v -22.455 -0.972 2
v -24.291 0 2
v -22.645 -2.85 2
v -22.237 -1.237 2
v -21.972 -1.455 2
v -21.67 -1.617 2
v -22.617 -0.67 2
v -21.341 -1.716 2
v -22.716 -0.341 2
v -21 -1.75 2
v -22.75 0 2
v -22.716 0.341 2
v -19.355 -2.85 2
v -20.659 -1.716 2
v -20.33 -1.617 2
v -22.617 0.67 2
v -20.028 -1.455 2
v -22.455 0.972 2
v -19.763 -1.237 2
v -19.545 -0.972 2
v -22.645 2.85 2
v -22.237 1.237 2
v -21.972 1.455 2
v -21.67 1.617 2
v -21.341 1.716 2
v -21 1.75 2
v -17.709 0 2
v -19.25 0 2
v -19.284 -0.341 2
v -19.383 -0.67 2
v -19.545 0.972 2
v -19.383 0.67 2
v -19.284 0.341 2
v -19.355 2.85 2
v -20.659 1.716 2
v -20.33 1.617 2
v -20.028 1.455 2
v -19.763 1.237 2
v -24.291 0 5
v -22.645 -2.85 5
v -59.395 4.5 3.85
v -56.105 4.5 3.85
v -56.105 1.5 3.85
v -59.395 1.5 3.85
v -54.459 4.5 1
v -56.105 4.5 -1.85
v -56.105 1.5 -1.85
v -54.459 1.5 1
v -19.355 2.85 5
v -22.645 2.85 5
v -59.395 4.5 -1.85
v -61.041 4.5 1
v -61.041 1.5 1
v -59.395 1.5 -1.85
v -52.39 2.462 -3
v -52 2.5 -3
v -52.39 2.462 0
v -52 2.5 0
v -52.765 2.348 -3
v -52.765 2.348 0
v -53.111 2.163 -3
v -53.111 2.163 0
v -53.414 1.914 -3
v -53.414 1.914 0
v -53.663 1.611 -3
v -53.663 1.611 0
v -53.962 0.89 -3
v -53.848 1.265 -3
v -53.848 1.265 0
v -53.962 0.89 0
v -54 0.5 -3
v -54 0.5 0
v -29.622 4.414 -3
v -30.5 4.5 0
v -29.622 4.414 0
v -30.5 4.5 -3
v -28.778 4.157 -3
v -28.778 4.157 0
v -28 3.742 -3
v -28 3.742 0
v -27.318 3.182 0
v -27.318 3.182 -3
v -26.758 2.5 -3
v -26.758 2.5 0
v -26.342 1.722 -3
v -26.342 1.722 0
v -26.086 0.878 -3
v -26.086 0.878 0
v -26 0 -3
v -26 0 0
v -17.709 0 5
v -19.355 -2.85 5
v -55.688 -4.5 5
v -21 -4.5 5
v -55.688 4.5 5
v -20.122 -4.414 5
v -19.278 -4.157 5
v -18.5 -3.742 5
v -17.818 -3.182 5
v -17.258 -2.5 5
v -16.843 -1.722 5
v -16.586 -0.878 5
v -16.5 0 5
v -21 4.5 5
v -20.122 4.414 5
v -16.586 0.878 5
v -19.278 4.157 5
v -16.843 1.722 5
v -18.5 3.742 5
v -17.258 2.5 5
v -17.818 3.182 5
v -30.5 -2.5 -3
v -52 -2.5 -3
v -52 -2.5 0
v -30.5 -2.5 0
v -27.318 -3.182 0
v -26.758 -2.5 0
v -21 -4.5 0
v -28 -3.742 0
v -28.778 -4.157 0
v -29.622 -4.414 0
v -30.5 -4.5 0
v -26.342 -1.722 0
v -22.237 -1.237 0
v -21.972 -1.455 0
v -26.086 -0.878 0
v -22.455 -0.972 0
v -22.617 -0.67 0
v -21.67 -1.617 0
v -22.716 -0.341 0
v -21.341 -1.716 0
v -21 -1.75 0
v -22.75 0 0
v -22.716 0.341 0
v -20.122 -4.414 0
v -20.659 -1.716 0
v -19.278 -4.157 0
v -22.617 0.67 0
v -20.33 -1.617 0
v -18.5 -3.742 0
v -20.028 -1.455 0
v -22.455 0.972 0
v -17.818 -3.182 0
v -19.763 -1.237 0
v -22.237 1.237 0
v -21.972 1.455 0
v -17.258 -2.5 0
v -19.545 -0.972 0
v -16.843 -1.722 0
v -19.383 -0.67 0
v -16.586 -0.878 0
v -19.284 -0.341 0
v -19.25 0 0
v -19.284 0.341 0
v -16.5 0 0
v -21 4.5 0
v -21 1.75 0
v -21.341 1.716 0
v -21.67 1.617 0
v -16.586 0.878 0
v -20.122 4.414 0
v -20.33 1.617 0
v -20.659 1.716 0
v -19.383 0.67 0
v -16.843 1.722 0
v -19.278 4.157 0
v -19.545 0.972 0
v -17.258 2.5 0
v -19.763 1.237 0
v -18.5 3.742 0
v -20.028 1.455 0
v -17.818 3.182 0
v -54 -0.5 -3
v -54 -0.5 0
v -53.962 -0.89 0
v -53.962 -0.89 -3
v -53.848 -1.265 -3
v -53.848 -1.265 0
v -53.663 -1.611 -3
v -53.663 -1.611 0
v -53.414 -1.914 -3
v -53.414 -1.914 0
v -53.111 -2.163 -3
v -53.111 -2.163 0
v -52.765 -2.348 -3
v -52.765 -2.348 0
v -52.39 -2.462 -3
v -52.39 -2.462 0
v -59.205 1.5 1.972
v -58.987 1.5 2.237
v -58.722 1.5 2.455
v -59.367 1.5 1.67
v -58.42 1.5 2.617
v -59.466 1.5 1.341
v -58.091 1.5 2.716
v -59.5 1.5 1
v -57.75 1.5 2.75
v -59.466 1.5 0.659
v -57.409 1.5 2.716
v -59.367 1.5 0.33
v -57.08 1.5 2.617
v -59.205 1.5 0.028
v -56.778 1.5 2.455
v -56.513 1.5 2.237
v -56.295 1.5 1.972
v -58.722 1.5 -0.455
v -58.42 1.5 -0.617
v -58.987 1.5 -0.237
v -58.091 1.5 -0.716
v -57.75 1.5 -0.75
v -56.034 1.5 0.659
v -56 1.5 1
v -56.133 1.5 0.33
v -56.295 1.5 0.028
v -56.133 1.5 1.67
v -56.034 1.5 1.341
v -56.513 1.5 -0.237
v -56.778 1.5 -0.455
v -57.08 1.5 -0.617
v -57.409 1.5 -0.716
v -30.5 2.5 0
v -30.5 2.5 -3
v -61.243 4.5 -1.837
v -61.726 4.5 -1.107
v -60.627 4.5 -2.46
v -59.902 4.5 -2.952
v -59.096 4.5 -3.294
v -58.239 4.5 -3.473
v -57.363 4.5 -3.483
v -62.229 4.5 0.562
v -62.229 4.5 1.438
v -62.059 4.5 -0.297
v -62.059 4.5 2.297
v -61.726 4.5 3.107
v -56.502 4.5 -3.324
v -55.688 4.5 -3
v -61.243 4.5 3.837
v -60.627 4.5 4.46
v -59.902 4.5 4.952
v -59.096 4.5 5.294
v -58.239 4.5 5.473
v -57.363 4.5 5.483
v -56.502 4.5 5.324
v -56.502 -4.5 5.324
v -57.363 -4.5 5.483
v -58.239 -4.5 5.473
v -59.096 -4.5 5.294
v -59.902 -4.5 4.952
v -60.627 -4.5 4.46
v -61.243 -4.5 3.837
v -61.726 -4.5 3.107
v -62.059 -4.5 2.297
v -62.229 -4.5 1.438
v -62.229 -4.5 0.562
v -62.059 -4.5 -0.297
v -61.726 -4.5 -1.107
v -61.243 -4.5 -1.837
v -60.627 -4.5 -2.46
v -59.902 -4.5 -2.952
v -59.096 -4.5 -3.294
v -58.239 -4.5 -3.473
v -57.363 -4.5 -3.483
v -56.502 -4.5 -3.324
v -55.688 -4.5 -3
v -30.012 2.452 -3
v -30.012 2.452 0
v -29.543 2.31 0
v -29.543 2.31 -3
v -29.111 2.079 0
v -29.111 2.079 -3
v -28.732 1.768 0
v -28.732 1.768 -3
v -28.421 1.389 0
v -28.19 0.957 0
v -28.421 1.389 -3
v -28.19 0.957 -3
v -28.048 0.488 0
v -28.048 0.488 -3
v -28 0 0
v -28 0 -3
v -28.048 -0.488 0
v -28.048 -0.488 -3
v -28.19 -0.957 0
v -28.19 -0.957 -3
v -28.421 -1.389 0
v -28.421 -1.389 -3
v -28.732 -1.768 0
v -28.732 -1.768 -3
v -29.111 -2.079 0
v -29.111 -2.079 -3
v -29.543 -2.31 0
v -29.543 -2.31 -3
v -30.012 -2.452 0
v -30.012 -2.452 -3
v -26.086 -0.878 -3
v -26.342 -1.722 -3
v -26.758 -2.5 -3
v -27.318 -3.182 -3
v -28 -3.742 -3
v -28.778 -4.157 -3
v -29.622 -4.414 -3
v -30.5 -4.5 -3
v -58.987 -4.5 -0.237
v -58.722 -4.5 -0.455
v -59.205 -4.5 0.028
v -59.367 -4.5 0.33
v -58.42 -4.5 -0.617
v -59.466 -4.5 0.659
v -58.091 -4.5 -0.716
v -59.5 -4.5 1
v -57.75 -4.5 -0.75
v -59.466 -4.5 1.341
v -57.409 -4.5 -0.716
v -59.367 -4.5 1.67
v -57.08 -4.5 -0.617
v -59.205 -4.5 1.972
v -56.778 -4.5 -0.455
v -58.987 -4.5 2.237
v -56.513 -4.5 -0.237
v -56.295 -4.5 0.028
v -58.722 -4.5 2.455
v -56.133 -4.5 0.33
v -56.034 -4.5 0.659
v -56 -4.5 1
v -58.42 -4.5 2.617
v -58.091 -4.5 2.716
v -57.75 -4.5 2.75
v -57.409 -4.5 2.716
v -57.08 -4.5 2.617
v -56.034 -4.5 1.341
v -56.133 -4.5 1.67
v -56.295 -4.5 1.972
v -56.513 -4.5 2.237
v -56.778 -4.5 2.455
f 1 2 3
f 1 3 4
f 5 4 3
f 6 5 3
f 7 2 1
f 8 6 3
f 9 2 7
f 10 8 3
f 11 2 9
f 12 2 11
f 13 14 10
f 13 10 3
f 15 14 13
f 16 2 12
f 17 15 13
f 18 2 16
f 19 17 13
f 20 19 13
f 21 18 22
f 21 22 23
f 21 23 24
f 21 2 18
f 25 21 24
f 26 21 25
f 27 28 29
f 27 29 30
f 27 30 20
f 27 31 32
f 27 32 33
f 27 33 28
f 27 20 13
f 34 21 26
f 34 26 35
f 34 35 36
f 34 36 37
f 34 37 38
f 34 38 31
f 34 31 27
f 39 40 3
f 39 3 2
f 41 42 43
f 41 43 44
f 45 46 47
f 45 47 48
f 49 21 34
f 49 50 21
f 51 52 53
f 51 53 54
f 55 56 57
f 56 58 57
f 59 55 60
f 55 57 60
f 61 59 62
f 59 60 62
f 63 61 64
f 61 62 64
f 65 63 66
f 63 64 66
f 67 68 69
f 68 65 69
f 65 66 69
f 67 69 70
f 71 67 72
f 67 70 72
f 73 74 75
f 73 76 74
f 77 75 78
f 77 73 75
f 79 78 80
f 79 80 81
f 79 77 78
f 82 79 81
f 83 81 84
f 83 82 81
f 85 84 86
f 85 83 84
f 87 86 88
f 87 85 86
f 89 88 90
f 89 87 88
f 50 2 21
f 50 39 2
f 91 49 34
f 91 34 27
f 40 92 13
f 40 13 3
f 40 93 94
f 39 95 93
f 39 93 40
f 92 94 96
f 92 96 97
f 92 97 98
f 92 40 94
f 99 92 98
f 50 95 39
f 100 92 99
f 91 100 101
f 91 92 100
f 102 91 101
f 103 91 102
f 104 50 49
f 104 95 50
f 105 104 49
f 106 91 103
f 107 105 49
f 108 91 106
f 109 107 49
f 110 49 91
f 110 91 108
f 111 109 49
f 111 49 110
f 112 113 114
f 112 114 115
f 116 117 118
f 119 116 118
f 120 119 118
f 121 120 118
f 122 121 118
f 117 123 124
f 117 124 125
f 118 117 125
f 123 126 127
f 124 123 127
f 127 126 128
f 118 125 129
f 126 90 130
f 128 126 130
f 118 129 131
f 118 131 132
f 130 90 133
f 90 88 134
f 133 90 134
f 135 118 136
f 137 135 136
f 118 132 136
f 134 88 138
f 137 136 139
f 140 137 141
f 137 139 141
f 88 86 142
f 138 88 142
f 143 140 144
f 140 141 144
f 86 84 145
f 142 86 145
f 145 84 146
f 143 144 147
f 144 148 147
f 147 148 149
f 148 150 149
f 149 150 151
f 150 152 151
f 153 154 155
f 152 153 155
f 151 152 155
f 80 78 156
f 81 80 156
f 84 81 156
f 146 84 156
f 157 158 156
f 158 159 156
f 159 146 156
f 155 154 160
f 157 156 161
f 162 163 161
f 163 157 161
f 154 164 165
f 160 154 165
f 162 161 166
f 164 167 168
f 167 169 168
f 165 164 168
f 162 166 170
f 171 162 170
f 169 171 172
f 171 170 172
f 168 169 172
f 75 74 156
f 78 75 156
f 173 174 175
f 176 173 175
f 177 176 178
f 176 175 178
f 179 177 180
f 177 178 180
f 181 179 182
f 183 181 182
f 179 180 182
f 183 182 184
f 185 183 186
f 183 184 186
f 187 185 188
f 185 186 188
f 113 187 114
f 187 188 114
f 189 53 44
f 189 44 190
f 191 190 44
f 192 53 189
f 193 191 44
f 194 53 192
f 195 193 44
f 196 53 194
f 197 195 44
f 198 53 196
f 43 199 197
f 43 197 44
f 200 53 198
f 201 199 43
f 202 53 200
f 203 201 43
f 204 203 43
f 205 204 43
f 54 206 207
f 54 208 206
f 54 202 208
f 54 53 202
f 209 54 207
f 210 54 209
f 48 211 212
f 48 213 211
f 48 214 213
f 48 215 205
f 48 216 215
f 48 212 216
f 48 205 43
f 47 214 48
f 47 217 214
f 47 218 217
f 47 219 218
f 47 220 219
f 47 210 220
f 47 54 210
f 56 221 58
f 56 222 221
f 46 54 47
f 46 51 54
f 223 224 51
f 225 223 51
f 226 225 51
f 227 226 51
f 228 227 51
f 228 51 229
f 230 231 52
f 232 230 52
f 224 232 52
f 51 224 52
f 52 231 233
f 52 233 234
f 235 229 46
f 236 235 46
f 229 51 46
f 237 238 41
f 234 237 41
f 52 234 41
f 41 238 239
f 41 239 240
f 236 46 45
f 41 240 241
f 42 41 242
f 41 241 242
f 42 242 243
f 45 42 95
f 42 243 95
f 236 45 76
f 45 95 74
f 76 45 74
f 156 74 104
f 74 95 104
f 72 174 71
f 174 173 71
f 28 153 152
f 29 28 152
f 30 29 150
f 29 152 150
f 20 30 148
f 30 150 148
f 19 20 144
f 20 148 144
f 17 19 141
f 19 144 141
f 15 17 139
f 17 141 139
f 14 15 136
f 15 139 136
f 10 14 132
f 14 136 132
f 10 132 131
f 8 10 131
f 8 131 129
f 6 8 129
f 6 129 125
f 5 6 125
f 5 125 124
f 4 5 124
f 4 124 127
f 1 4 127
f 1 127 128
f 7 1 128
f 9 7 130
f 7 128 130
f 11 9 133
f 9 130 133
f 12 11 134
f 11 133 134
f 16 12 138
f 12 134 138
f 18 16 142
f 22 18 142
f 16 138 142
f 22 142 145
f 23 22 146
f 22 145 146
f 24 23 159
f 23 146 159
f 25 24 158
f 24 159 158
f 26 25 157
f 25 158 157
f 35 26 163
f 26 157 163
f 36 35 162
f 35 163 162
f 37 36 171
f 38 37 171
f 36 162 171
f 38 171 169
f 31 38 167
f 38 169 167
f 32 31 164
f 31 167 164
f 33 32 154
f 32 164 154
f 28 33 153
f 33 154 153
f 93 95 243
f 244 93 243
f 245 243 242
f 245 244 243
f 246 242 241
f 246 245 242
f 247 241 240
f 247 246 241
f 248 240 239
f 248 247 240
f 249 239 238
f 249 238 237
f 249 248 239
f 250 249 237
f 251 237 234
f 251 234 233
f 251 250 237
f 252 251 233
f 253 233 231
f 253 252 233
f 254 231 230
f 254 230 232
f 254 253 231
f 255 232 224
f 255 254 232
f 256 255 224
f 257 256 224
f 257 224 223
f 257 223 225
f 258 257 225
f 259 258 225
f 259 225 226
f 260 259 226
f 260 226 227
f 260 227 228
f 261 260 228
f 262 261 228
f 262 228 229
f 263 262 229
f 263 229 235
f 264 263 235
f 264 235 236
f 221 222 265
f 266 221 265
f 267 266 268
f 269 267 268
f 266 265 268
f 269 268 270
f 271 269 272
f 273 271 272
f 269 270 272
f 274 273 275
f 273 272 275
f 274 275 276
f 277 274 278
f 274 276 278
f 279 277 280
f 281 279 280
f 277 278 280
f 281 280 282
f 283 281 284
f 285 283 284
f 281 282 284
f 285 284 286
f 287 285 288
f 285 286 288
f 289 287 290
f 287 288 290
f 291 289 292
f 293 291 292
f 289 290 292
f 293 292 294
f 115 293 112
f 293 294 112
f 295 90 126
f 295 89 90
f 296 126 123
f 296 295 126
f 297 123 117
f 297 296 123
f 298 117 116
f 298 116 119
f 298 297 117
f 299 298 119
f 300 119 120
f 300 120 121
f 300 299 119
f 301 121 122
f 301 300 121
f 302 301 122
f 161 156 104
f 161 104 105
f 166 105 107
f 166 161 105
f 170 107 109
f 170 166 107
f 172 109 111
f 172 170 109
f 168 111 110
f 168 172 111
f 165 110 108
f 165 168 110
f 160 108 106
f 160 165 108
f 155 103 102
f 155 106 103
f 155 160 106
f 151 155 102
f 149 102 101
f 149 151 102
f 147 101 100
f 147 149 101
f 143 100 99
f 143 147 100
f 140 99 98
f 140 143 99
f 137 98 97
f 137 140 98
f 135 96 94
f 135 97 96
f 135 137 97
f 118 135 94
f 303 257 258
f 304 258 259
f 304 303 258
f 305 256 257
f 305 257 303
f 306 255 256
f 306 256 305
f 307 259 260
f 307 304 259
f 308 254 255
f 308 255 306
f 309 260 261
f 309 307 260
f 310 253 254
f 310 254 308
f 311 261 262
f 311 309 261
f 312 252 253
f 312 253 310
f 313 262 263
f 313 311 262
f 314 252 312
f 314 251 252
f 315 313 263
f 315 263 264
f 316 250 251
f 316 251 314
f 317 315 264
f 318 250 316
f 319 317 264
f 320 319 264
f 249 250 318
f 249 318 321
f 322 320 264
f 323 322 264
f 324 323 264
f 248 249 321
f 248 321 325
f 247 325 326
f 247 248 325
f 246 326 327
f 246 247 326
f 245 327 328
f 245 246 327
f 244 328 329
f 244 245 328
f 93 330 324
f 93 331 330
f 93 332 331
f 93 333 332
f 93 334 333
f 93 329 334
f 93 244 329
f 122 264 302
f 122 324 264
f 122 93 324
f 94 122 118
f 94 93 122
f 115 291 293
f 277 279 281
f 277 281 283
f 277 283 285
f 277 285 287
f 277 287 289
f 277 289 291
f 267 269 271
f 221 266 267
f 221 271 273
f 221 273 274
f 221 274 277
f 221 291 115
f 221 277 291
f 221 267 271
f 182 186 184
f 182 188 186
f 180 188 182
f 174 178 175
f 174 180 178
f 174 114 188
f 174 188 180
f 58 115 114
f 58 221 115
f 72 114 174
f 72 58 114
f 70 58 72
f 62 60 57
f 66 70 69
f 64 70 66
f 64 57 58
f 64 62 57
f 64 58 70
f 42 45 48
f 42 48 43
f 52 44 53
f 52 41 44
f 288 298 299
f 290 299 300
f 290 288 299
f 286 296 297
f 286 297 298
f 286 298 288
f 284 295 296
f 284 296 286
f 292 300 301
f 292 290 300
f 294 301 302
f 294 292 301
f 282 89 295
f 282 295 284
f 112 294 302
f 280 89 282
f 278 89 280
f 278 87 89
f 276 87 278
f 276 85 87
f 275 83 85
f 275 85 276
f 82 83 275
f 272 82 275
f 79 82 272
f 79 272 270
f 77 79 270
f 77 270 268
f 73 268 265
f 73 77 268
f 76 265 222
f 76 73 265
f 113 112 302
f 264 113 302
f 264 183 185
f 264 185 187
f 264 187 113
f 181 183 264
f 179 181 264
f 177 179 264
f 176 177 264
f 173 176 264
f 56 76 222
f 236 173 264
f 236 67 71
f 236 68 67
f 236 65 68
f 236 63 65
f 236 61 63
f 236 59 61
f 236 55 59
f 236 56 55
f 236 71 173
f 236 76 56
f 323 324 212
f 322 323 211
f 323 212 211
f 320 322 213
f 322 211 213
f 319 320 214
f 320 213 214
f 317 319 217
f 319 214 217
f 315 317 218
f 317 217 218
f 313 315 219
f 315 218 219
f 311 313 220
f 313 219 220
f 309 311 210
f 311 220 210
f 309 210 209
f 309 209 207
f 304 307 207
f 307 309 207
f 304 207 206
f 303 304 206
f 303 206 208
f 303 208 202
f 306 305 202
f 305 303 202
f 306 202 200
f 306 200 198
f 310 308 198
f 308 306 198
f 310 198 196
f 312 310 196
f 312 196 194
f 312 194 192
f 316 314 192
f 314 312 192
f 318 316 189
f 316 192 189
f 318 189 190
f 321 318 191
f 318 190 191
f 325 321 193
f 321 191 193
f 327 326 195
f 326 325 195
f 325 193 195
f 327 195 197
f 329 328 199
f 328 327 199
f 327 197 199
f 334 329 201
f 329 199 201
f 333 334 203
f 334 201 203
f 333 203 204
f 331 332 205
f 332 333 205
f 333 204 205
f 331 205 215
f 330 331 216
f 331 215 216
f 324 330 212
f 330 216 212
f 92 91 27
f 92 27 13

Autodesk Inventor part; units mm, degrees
ref_plane "YZ Plane" through (0, 0, 0) normal (1, 0, 0) x (0, 1, 0)
ref_plane "Płaszczyzna konstrukcyjna2" through (-16.0063, -4.5, 5) normal (0, 0, 1) x (1, 0, 0)
sketch "Szkic1" plane through (0, 0, 0) normal (0, 0, 1) x (1, 0, 0)
  circle A0 centre (-21, 0) radius 1.75 projected
  arc A1 (-11.0125, 4.5) -> (-15.9781, 0.0856) centre (-11.0125, -0.5) ccw projected
  line L0 (-21, 4.5) -> (-11.0125, 4.5) projected
  arc A2 (-21, 4.5) -> (-21, -4.5) centre (-21, 0) ccw projected
  line L1 (-11.0628, -4.5) -> (-21, -4.5) projected
  arc A3 (-15.9446, -0.5811) -> (-11.0628, -4.5) centre (-11.0628, 0.5) ccw projected
  line L2 (-21, 0) -> (-57.75, 0)
  line L3 (-21, 0) -> (-57.75, 0) construction
  line L4 (-21, -4.5) -> (-57.75, -4.5)
  line L5 (-57.75, 4.5) -> (-21, 4.5)
  arc A4 (-21, -4.5) -> (-21, 4.5) centre (-21, 0) ccw
  arc A5 (-57.75, 4.5) -> (-57.75, -4.5) centre (-57.75, 0) ccw
  line L6 (-57.75, 4.5) -> (-57.75, -4.5)
  arc A6 (-15.9781, 0.0856) -> (-15.9446, -0.5811) centre (-13.9919, -0.1486) ccw projected
  point P0 (0, 0)
  point P1 (-39.375, 0)
  dimension "d0" = 36.75
extrude "Wyciągnięcie proste1" add sketch "Szkic1" along normal up to surface (5 mm away) contours A2 A4 | A2 L4 L6 L2 | L2 L6 L5 A2
sketch "Szkic2" plane through (0, 0, 0) normal (0, 0, -1) x (-1, 0, 0)
  line L0 (21, 4.5) -> (57.75, 4.5) projected
  arc A0 (21, 4.5) -> (21, -4.5) centre (21, 0) ccw projected
  line L1 (57.75, -4.5) -> (21, -4.5) projected
  line L2 (57.75, 4.5) -> (57.75, -4.5) projected
  circle A1 centre (21, 0) radius 1.75 projected
  arc A2 (21, -4.5) -> (21, 4.5) centre (21, 0) ccw projected
  circle A3 centre (21, 0) radius 5
  point P0 (0, 0)
  point P1 (23.1794, 4.5)
  point P2 (23.1794, -4.5)
  dimension "d3" = 10
ref_plane "Płaszczyzna konstrukcyjna1" through (-25.5, -4.5, -3) normal (0, 0, -1) x (0, 1, 0)
extrude "Wyciągnięcie proste2" add sketch "Szkic2" along normal up to surface (3 mm away) contours L0 L2 L1 A3
fillet "Zaokrąglenie1" radius 4.5 2 edges at (-23.1794, -4.5, -1.5) (-23.1794, 4.5, -1.5)
sketch "Szkic4" plane through (-57.75, 4.5, 5) normal (0, 1, 0) x (1, 0, 0)
  line L0 (0, 8) -> (0, 0) projected
  circle A0 centre (0, 4) radius 1.75
  circle A1 centre (0, 4) radius 4
  point P0 (57.75, 5)
  point P1 (0, 2.25)
  point P2 (0, 5.75)
  dimension "d15" = 3.5
extrude "Wyciągnięcie proste6" add sketch "Szkic4" against normal up to surface (9 mm away) contours L0 A0 A1 picked at (-0.4587, 0.8057)
extrude "Wyciągnięcie proste7" cut sketch "Szkic4" against normal through all contours A0 L0 picked at (0.2531, 4.5256)
sketch "Szkic5" plane through (-30.5, 0, -3) normal (0, 0, -1) x (-1, 0, 0)
  arc A0 (0, 4.5) -> (0, -4.5) centre (0, 0) ccw projected
  line L0 (27.25, -4.5) -> (0, -4.5) projected
  line L1 (27.25, 4.5) -> (27.25, -4.5) projected
  line L2 (0, 4.5) -> (27.25, 4.5) projected
  line L3 (29, -4.5) -> (29, 4.5) projected
  line L4 (25.5, -4.5) -> (25.5, 4.5) projected
  line L5 (23.5, -4.5) -> (23.5, 4.5)
  arc A1 (0, 2.5) -> (0, -2.5) centre (0, 0) ccw
  line L6 (0, 2.5) -> (25.25, 2.5)
  line L7 (25.25, 2.5) -> (25.25, -2.5)
  line L8 (25.25, -2.5) -> (0, -2.5)
  point P0 (-30.5, 0)
  point P1 (23.5, -2.5)
  point P2 (23.5, 2.5)
  dimension "d20" = 2
  dimension "d21" = 2
extrude "Wyciągnięcie proste8" cut sketch "Szkic5" against normal up to surface (3 mm away) contours L5 L8 A1 L6
fillet "Zaokrąglenie2" radius 2 2 edges at (-54, 2.5, -1.5) (-54, -2.5, -1.5)
sketch "Szkic6" plane through (-21, 0, 5) normal (0, 0, 1) x (1, 0, 0)
  circle A0 centre (0, 0) radius 1.75 projected
  circle A1 centre (0, 0) radius 2.85
  line L0 (1.6454, 2.85) -> (3.2909, 0)
  line L1 (3.2909, 0) -> (1.6454, -2.85)
  line L2 (1.6454, -2.85) -> (-1.6454, -2.85)
  line L3 (-1.6454, -2.85) -> (-3.2909, 0)
  line L4 (-3.2909, 0) -> (-1.6454, 2.85)
  line L5 (-1.6454, 2.85) -> (1.6454, 2.85)
  point P0 (21, 0)
  point P1 (0, 2.85)
  dimension "d25" = 5.7
extrude "Wyciągnięcie proste9" cut sketch "Szkic6" against normal blind 3 contours A0 | A1 | A1 L0 L1 | A1 L5 L0 | L1 L2 A1 | A1 L4 L5 | L2 L3 A1 | A1 L3 L4
sketch "Szkic7" plane through (-21, 4.5, 5) normal (0, 1, 0) x (1, 0, 0)
  circle A0 centre (-36.75, 4) radius 1.75 projected
  circle A1 centre (-36.75, 4) radius 2.85
  circle A2 centre (-36.75, 4) radius 1.75 projected
  line L0 (-35.1046, 6.85) -> (-33.4591, 4)
  line L1 (-33.4591, 4) -> (-35.1046, 1.15)
  line L2 (-35.1046, 1.15) -> (-38.3954, 1.15)
  line L3 (-38.3954, 1.15) -> (-40.0409, 4)
  line L4 (-40.0409, 4) -> (-38.3954, 6.85)
  line L5 (-38.3954, 6.85) -> (-35.1046, 6.85)
  point P0 (21, 5)
  point P1 (-36.75, 6.85)
  dimension "d28" = 5.7
extrude "Wyciągnięcie proste10" cut sketch "Szkic7" against normal blind 3 contours A0 | A1 | A1 L0 L1 | A1 L5 L0 | L1 L2 A1 | A1 L4 L5 | L2 L3 A1 | A1 L3 L4
sketch "Szkic8" plane through (-21, -4.5, 0) normal (0, -1, 0) x (1, 0, 0)
  circle A0 centre (-36.75, 1) radius 1.75 projected
  circle A1 centre (-36.75, 1) radius 4.5
  arc A2 (-36.75, 5) -> (-36.75, -3) centre (-36.75, 1) ccw projected
  circle A3 centre (-36.75, 1) radius 1.75 projected
  arc A4 (-36.75, 5) -> (-36.75, -3) centre (-36.75, 1) ccw projected
  line L0 (-36.75, -3) -> (-9.5, -3) projected
  line L1 (-9.5, 0) -> (-9.5, -3) projected
  line L2 (-9.5, 0) -> (0, 0) projected
  line L3 (0, 0) -> (0, 5) projected
  line L4 (0, 5) -> (-36.75, 5) projected
  point P0 (21, 0)
  point P1 (-34.6884, 5)
  point P2 (-34.6884, -3)
  dimension "d31" = 9
extrude "Wyciągnięcie proste11" add sketch "Szkic8" against normal up to surface (9 mm away) contours L4 A2 L0 A1 picked at (-35.7134, 5.1254)
properties part number "L1"
